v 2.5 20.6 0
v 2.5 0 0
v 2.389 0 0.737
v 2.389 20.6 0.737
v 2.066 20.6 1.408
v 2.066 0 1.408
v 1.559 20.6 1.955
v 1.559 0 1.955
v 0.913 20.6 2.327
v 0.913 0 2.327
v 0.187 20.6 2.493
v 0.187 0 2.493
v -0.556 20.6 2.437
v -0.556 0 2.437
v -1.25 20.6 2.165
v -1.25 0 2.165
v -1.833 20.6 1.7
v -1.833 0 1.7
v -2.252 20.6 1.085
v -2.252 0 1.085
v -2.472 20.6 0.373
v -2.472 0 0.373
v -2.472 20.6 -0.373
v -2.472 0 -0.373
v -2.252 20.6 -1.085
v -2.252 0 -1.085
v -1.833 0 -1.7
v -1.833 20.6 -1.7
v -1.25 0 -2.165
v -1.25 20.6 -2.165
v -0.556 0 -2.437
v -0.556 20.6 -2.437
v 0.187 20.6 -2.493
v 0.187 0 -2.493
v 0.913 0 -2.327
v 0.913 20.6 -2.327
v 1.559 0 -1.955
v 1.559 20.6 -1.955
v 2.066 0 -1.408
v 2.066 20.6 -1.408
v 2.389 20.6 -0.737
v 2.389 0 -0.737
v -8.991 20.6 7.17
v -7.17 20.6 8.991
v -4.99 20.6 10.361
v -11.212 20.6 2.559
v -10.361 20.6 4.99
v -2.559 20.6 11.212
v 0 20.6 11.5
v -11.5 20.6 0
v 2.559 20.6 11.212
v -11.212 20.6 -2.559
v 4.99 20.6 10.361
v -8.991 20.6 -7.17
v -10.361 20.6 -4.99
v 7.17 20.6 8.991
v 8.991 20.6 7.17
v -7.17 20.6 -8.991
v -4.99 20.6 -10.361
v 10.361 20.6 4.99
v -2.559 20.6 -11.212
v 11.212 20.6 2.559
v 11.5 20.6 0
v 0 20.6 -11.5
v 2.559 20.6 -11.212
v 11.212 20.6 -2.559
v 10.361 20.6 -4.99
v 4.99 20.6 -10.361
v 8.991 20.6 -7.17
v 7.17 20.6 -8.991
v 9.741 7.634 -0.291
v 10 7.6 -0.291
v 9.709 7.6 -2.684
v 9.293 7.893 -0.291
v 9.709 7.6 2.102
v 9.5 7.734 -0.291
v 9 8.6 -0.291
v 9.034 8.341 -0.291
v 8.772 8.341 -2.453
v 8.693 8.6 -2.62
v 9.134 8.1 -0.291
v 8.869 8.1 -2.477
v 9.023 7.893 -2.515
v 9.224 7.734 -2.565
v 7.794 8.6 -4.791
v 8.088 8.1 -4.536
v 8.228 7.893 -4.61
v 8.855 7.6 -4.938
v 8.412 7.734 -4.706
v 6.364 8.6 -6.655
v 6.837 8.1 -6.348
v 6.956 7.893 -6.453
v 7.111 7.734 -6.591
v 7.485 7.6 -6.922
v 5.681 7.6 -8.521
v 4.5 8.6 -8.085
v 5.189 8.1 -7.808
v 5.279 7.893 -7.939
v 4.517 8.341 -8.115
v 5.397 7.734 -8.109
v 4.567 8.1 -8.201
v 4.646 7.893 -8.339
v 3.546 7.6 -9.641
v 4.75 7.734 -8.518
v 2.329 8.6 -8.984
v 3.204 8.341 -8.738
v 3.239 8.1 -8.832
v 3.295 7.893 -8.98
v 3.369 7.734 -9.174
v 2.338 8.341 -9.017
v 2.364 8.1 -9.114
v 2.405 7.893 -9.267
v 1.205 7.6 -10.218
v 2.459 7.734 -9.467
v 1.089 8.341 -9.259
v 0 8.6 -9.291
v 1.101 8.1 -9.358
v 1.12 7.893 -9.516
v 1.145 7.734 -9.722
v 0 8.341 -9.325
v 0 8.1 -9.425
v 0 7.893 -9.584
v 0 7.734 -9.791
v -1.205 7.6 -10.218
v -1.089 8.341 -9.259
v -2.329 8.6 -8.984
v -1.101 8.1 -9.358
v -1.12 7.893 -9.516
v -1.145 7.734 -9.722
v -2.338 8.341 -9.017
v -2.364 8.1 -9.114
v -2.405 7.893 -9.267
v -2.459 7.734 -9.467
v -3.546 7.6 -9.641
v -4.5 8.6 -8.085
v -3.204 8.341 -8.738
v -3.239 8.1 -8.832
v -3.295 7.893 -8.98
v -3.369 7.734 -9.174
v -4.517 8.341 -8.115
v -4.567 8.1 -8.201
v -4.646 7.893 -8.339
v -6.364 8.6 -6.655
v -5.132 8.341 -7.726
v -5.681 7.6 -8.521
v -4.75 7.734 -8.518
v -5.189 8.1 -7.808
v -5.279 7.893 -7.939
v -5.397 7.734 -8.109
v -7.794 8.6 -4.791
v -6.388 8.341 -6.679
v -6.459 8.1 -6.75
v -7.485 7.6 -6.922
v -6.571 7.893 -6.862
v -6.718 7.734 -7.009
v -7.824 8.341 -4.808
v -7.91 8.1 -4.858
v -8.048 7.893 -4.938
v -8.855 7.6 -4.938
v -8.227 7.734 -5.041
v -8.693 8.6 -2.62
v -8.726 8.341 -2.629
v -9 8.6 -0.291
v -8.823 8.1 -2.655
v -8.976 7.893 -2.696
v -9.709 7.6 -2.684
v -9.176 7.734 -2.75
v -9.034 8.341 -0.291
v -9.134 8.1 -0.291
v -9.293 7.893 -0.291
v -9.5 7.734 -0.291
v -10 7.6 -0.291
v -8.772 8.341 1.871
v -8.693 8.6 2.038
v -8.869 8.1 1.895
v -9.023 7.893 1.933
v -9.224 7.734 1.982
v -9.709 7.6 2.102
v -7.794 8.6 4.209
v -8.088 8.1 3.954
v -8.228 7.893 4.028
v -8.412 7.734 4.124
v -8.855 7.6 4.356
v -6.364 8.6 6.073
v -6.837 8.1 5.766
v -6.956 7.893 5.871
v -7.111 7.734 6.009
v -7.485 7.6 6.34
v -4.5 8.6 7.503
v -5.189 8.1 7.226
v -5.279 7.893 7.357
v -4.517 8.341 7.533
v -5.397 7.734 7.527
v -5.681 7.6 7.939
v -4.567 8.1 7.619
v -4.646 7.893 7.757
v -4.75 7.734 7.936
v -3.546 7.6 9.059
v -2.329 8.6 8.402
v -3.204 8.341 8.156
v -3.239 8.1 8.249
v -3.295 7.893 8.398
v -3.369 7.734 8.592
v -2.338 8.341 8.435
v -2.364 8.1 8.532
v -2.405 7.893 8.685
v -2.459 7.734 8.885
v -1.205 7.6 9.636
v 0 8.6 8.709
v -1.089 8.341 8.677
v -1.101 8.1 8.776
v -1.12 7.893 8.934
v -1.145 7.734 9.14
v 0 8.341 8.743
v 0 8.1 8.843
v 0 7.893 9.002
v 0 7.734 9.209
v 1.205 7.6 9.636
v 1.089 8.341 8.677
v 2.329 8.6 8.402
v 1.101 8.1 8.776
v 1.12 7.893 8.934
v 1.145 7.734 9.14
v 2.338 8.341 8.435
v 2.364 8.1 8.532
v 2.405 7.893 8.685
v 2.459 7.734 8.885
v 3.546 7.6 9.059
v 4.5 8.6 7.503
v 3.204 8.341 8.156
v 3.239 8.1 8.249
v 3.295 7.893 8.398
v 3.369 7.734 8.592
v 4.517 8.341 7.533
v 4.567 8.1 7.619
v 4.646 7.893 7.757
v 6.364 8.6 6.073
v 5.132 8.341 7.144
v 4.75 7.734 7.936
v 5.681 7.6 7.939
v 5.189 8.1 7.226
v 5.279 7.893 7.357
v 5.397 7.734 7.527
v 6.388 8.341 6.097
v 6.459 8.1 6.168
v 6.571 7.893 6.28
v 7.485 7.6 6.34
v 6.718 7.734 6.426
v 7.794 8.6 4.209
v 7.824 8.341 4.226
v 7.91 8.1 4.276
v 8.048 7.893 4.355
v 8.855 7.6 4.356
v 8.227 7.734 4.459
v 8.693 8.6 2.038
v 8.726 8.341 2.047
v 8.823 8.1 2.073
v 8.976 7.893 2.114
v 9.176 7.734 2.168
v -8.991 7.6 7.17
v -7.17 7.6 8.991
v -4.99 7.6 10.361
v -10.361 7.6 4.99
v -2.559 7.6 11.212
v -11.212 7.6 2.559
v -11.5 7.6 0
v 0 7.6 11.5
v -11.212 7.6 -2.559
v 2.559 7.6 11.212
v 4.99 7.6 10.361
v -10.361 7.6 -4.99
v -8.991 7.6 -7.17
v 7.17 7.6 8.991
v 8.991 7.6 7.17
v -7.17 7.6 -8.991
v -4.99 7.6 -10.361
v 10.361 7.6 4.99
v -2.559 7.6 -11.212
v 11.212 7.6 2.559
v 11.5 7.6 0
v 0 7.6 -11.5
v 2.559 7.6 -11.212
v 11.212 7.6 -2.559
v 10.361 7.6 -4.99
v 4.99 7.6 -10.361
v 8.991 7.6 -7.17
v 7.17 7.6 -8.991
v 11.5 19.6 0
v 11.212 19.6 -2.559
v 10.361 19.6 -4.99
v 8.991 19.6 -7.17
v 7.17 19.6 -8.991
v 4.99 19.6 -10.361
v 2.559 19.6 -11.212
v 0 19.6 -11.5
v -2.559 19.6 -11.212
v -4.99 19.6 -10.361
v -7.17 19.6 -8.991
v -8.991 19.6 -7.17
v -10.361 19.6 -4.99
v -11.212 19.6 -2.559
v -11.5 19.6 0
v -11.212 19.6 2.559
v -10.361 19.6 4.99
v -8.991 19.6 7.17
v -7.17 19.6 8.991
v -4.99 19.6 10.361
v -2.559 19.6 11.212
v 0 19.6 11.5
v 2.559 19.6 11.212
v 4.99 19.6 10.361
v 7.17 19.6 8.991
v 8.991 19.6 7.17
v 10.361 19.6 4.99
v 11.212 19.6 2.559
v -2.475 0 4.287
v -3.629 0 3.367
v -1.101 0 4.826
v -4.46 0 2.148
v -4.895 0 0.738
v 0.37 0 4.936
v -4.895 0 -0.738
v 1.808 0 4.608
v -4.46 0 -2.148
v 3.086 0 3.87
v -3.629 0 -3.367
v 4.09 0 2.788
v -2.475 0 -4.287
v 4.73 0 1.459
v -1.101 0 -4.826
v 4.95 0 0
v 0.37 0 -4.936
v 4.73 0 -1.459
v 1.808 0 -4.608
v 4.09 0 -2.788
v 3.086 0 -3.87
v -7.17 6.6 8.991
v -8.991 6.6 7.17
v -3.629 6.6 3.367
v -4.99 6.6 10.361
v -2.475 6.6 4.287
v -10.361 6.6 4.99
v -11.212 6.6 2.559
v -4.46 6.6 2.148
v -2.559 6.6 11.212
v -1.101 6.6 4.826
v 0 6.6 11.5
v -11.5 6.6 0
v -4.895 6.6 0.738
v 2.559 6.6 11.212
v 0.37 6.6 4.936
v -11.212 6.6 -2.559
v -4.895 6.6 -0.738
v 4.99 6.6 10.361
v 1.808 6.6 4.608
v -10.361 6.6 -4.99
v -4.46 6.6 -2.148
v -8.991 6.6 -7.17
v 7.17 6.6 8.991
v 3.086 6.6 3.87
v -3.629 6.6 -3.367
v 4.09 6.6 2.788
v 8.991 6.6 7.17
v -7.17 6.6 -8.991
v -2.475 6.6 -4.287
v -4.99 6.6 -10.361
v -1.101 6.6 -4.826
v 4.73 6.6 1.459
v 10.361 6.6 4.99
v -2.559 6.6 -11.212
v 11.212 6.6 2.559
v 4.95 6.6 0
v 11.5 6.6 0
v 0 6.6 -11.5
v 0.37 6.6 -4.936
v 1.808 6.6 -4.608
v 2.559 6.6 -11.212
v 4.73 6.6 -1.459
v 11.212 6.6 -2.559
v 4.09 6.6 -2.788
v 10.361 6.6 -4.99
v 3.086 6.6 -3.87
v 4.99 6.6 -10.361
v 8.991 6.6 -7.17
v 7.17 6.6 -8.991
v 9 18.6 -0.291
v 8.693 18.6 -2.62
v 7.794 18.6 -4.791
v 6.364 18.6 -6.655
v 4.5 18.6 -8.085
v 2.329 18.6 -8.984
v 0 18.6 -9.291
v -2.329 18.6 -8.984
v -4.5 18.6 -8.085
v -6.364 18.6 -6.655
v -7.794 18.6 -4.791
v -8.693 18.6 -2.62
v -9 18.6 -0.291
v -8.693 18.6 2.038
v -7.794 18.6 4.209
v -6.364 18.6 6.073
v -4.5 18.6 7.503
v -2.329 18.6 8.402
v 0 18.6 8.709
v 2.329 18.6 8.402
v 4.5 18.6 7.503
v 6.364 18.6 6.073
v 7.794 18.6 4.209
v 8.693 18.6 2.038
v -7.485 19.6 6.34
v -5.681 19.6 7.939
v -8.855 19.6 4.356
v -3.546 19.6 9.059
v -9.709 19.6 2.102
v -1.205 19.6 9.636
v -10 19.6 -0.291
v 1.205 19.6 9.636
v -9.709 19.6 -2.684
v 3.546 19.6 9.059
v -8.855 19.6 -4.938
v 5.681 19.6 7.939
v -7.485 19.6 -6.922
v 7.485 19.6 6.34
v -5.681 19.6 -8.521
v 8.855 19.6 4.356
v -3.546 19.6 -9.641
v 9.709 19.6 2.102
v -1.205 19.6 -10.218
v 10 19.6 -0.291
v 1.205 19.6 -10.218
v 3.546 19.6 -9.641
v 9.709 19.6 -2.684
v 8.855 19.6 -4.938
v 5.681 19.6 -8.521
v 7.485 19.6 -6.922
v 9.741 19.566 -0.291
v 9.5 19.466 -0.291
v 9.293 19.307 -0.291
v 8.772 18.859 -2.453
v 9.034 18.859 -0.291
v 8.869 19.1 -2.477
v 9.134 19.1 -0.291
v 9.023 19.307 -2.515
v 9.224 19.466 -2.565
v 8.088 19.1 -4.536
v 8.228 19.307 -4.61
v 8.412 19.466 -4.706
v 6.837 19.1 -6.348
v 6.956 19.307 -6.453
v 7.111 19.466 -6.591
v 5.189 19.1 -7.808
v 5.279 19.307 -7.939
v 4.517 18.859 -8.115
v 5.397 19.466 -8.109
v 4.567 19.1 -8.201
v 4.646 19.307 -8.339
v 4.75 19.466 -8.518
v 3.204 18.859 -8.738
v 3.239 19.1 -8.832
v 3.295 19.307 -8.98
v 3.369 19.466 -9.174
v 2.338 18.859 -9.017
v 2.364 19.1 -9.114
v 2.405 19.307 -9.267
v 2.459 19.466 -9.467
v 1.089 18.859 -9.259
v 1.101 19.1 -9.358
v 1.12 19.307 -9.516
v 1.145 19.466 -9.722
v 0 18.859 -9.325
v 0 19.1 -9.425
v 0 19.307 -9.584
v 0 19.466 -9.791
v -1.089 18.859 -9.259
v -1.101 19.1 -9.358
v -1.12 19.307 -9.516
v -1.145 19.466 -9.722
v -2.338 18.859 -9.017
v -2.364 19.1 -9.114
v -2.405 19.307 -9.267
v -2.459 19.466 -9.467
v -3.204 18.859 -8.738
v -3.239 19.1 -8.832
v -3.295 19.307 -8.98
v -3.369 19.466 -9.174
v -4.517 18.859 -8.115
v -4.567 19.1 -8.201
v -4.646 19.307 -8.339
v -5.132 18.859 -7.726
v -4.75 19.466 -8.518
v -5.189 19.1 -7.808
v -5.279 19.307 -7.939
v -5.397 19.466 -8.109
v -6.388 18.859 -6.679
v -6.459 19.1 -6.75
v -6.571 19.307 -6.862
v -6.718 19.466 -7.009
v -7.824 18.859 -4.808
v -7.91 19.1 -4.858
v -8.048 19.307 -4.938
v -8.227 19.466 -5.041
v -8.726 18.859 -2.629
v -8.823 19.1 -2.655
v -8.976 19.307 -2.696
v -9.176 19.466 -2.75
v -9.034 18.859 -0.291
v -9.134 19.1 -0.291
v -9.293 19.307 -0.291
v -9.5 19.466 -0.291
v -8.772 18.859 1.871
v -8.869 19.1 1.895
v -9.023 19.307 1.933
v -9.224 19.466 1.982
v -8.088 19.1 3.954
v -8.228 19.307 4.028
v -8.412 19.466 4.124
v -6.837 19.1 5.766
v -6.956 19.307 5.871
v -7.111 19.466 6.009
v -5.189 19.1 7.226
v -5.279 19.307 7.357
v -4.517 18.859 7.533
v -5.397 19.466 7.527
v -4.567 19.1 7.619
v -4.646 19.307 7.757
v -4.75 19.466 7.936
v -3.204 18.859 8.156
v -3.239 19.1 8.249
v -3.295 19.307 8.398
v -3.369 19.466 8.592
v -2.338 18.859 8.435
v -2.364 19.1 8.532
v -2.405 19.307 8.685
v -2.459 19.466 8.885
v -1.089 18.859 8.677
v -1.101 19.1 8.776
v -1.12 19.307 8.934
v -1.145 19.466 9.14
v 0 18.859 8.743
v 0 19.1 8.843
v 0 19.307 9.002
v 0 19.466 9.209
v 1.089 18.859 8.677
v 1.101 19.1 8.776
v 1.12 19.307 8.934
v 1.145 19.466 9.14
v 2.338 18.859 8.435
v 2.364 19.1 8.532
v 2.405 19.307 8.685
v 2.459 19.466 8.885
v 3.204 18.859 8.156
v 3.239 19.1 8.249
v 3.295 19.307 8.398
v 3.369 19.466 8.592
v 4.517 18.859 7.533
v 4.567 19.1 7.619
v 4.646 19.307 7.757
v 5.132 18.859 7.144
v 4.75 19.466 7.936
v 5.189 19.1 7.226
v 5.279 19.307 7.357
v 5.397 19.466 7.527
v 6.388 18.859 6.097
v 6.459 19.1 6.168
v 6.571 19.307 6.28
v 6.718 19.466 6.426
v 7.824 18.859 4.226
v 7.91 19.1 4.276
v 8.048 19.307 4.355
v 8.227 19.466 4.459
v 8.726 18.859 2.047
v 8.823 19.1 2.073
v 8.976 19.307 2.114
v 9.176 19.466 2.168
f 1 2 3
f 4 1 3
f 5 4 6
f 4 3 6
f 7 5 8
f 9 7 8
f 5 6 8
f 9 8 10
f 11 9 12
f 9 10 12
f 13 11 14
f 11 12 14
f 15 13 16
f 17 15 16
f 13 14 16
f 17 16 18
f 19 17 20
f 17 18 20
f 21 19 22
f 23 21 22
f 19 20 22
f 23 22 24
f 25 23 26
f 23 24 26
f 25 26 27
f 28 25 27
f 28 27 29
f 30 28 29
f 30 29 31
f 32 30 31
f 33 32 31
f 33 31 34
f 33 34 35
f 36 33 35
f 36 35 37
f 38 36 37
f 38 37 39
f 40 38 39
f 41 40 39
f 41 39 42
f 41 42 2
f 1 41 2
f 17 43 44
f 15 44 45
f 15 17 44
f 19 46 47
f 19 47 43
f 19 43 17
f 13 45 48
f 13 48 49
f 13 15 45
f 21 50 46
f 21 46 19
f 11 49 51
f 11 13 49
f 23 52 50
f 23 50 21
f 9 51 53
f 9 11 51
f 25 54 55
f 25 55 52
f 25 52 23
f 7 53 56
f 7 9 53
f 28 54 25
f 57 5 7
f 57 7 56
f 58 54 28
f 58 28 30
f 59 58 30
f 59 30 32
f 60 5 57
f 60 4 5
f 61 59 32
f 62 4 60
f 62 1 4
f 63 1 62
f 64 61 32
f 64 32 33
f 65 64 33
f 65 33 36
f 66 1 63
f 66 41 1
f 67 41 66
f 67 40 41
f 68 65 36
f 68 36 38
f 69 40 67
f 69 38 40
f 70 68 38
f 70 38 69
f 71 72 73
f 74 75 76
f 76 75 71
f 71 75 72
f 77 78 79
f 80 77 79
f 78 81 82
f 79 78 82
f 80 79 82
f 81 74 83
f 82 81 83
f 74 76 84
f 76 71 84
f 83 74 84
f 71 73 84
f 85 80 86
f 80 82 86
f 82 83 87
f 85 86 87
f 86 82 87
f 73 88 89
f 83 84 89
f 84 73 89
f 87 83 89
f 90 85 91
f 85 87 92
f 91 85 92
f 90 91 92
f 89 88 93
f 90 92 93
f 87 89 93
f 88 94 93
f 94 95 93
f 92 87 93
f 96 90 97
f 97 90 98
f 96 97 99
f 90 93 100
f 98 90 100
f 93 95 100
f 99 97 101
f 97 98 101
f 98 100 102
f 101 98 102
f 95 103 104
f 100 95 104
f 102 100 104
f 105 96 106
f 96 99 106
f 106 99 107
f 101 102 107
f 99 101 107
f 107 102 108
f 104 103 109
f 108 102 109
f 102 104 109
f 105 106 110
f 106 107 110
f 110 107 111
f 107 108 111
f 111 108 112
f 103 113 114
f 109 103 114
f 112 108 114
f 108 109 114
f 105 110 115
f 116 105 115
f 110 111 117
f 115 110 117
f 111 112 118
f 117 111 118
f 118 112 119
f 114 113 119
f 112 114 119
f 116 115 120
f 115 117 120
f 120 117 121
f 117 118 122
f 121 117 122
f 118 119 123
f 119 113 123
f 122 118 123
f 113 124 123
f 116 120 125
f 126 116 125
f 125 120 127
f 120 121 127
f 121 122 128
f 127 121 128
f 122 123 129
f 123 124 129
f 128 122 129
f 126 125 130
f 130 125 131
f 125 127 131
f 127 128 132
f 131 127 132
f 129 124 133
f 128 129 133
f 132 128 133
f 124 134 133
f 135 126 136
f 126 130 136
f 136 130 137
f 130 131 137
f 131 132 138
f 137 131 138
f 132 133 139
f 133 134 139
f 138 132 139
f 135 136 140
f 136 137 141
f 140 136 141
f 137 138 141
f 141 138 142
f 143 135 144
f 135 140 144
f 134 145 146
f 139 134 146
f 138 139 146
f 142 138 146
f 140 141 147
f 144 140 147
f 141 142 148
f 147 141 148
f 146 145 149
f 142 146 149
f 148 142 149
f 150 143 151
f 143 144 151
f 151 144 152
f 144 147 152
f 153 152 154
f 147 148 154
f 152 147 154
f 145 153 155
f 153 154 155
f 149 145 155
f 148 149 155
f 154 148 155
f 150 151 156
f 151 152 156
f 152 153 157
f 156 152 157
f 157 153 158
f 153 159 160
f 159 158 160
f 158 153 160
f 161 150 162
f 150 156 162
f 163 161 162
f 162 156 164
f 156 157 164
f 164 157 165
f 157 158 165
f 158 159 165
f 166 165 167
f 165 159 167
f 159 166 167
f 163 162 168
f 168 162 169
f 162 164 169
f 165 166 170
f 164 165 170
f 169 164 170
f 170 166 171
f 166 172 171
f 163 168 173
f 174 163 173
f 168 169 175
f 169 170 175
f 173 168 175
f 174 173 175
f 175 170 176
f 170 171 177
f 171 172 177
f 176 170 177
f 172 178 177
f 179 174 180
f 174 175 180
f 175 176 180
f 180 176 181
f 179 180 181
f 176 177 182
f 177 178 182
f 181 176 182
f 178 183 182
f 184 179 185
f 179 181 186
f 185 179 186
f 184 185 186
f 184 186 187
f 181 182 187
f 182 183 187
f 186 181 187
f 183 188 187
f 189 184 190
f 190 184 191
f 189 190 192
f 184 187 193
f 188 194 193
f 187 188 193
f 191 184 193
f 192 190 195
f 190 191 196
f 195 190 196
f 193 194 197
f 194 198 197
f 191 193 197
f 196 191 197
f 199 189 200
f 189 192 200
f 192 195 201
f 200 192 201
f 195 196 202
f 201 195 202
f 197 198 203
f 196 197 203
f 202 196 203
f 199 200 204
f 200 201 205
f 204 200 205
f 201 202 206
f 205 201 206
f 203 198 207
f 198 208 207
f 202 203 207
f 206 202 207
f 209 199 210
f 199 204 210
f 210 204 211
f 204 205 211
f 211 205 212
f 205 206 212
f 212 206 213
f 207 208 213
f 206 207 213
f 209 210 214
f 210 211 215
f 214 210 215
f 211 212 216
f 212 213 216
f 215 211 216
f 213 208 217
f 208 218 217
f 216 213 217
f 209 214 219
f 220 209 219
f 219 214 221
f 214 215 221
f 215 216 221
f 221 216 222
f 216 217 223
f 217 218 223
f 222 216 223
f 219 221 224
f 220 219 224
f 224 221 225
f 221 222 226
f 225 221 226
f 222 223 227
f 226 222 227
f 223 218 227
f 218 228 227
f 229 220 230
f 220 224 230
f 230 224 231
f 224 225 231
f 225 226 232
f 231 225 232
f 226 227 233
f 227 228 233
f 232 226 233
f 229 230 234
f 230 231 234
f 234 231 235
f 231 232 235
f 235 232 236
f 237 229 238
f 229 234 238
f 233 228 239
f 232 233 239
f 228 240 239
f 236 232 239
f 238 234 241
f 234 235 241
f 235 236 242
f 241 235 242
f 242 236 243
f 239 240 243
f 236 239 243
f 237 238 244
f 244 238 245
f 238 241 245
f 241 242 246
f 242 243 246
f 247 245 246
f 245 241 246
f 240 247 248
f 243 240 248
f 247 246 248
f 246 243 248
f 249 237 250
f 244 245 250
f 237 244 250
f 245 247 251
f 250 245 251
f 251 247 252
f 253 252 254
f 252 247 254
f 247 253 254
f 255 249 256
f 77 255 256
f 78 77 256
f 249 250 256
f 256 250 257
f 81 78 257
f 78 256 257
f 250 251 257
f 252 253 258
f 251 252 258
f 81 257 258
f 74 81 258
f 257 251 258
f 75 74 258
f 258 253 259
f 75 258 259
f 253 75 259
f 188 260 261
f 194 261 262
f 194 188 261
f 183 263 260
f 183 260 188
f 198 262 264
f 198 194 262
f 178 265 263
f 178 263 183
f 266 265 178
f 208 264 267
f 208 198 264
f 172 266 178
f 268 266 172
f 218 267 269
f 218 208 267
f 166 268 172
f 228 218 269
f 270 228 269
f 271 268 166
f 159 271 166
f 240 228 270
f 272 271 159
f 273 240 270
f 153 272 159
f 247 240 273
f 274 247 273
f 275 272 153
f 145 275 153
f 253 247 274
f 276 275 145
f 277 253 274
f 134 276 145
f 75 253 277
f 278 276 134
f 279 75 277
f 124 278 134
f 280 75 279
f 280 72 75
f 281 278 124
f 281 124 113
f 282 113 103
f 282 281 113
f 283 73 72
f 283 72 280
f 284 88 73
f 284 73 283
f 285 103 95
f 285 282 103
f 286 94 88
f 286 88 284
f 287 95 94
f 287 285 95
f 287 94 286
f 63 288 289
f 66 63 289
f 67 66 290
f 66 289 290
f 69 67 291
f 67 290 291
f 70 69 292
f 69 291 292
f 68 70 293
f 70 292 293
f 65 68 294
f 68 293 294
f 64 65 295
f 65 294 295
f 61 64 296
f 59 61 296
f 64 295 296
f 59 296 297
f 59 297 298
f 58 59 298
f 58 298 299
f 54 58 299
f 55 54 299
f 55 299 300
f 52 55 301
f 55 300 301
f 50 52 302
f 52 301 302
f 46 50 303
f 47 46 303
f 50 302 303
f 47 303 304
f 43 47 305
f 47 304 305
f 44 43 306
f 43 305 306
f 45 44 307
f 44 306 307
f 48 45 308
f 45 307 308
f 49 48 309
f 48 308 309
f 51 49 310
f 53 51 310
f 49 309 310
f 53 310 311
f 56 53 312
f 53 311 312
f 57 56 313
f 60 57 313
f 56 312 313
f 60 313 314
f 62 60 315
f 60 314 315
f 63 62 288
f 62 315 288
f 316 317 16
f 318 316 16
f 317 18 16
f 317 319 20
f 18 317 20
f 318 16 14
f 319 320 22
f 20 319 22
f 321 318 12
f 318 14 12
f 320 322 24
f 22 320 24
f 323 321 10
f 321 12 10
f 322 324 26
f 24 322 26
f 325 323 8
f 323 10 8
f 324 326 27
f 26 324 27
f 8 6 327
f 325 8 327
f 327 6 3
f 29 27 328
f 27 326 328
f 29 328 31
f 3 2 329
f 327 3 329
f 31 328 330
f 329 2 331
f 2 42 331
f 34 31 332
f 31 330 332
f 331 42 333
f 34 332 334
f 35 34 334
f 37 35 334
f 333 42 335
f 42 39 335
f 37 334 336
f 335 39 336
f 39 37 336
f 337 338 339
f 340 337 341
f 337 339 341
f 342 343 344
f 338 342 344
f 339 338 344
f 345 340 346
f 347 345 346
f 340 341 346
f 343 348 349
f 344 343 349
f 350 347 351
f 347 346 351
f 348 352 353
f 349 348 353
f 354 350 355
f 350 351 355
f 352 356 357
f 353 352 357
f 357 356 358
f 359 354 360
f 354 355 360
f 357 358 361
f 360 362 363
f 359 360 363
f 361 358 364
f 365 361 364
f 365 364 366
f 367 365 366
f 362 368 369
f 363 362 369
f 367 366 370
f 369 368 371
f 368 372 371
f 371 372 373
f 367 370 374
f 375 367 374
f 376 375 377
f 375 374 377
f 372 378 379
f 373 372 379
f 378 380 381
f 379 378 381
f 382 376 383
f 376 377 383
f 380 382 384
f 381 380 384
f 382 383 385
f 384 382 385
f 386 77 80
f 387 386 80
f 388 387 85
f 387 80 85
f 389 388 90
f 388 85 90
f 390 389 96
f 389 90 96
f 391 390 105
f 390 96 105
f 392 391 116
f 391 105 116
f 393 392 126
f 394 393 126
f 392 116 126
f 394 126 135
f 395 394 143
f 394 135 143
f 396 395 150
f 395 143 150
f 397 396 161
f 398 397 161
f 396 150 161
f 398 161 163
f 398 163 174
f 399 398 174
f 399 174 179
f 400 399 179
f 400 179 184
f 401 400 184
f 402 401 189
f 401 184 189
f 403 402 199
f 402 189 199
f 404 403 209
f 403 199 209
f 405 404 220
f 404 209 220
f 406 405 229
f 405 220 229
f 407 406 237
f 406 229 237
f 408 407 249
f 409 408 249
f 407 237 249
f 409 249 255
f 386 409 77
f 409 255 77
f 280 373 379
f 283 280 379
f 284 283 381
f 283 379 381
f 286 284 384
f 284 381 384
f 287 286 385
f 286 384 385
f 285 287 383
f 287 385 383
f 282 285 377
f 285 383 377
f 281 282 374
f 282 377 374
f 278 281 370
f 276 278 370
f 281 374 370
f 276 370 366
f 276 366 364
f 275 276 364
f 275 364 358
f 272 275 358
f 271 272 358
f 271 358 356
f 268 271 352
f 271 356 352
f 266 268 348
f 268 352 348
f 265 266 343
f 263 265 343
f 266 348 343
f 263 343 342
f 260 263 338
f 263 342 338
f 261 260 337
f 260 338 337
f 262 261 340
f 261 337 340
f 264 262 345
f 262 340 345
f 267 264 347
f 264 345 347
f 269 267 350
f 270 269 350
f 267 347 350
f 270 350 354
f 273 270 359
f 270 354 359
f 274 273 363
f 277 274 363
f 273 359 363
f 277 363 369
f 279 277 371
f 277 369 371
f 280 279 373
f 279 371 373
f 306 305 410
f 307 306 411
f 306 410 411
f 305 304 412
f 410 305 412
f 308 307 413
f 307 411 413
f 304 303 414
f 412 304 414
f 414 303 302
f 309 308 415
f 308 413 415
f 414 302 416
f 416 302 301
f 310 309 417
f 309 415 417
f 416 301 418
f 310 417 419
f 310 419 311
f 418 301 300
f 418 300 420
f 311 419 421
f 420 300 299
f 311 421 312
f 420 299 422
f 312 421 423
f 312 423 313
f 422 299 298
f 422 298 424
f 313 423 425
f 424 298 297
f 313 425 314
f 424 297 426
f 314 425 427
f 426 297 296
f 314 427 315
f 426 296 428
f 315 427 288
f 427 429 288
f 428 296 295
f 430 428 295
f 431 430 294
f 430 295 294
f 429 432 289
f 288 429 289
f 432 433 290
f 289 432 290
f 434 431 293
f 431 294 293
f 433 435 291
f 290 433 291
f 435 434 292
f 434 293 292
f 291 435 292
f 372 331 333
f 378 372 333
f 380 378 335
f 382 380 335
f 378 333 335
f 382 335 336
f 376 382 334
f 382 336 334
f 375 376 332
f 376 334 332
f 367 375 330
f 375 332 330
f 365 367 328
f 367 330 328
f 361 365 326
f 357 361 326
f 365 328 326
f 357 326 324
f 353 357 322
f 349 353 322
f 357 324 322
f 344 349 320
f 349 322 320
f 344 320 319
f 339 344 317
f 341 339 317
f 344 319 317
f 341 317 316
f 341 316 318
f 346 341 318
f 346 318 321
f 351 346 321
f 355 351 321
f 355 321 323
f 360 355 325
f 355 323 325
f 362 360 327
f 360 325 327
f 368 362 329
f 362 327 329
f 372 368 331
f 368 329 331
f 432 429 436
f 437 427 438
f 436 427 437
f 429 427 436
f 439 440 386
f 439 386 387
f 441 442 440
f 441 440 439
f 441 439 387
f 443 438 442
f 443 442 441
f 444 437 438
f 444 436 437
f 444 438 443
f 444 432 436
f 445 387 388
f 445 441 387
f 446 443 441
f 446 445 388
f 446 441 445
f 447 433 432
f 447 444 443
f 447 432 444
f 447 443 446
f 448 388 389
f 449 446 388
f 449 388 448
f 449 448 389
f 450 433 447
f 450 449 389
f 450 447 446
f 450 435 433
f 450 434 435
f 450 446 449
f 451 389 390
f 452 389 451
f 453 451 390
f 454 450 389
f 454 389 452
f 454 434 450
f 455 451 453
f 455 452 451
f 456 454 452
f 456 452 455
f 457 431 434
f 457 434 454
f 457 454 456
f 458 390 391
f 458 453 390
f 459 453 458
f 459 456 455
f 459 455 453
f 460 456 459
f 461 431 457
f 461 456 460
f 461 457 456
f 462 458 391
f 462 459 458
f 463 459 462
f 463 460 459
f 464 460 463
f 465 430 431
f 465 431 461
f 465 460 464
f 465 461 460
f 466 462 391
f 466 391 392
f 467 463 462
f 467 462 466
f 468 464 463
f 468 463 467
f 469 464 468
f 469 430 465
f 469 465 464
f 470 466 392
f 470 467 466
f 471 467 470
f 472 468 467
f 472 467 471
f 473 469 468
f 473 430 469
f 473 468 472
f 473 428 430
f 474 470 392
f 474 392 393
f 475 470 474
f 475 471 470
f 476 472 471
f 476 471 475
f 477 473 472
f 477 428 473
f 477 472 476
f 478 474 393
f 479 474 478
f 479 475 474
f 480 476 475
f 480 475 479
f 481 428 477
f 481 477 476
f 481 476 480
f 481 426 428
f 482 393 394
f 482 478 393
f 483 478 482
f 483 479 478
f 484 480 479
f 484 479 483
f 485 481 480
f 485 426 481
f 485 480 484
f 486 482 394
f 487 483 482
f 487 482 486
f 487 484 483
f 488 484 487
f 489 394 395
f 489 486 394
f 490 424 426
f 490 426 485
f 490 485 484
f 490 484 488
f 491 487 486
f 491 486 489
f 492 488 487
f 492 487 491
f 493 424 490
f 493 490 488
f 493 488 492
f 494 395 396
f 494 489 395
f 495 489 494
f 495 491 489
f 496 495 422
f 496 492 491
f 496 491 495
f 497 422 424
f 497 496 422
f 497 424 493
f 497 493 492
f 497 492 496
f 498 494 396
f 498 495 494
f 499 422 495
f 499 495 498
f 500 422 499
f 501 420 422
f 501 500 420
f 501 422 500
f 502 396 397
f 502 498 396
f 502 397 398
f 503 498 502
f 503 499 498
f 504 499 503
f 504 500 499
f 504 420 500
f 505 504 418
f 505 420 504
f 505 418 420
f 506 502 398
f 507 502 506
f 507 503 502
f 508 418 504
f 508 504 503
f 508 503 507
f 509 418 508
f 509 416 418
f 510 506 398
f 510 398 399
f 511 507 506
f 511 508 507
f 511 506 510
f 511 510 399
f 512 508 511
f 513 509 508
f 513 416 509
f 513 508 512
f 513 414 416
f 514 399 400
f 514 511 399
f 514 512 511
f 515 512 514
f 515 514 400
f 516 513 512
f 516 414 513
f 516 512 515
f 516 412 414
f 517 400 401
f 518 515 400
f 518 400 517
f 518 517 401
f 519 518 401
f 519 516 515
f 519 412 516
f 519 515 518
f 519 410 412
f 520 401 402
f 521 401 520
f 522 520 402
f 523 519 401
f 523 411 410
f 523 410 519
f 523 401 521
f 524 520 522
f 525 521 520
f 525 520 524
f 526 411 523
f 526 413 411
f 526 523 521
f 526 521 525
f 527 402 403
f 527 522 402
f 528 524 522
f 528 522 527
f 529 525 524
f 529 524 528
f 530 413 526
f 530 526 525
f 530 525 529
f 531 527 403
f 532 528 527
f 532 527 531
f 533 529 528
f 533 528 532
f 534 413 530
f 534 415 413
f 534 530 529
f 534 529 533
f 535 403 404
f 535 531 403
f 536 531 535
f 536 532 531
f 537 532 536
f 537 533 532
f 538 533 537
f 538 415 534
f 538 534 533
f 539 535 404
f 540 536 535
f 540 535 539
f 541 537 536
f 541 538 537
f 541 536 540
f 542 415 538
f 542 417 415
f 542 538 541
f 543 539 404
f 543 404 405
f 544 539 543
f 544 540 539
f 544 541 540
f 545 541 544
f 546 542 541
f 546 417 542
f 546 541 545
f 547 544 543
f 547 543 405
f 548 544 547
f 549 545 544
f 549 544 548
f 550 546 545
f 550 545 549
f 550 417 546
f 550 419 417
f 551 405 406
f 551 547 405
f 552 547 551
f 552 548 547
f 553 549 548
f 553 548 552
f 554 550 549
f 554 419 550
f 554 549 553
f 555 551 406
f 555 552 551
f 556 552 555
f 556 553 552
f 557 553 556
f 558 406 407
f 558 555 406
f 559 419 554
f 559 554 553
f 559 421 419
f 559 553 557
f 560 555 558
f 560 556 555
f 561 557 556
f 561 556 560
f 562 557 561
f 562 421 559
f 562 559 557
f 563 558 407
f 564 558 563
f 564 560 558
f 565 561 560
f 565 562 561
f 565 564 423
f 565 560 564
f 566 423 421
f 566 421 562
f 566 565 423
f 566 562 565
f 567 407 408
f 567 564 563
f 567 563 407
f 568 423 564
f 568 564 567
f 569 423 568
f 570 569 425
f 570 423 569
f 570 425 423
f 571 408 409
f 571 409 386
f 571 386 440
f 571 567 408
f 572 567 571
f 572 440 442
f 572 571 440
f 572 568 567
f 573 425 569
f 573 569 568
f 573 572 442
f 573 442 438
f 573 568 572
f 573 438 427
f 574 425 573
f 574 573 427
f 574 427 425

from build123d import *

# Parameters (mm, degrees)
SKETCH1_R           = 4.95
BOSS_EXTRUDE2_DEPTH = 6.6
SKETCH4_R           = 11.5
BOSS_EXTRUDE3_DEPTH = 1
SKETCH5_R           = 9
BOSS_EXTRUDE4_DEPTH = 12
SKETCH6_R           = 11.5
BOSS_EXTRUDE5_DEPTH = 1
FILLET1_R           = 1
FILLET2_R           = 1
SKETCH7_R           = 2.5
CUT_EXTRUDE1_DEPTH  = 21.6


with BuildPart() as part:
    # Sketch1 → Boss-Extrude2 (new body)
    with BuildSketch(Plane(origin=(0, 0, 0), x_dir=(1, 0, 0), z_dir=(0, 1, 0))):
        Circle(SKETCH1_R)
    extrude(amount=BOSS_EXTRUDE2_DEPTH)

    # Sketch4 → Boss-Extrude3 (add)
    with BuildSketch(Plane(origin=(0, 6.6, 0), x_dir=(1, 0, 0), z_dir=(0, 1, 0))):
        Circle(SKETCH4_R)
    extrude(amount=BOSS_EXTRUDE3_DEPTH)

    # Sketch5 → Boss-Extrude4 (add)
    with BuildSketch(Plane(origin=(0, 7.6, 0), x_dir=(1, 0, 0), z_dir=(0, 1, 0))):
        with Locations((0, 0.291114712)):
            Circle(SKETCH5_R)
    extrude(amount=BOSS_EXTRUDE4_DEPTH)

    # Sketch6 → Boss-Extrude5 (add)
    with BuildSketch(Plane(origin=(0, 19.6, 0), x_dir=(1, 0, 0), z_dir=(0, 1, 0))):
        Circle(SKETCH6_R)
    extrude(amount=BOSS_EXTRUDE5_DEPTH)

    # Fillet1
    fillet1_edges = [part.edges().sort_by_distance(p)[0] for p in [
        (-9, 7.6, -0.291114712),
    ]]
    fillet(fillet1_edges, radius=FILLET1_R)

    # Fillet2
    fillet2_edges = [part.edges().sort_by_distance(p)[0] for p in [
        (-9, 19.6, -0.291114712),
    ]]
    fillet(fillet2_edges, radius=FILLET2_R)

    # Sketch7 → Cut-Extrude1 (cut, through all)
    with BuildSketch(Plane.XZ):
        Circle(SKETCH7_R)
    extrude(amount=-CUT_EXTRUDE1_DEPTH, mode=Mode.SUBTRACT)


solid = part.part
